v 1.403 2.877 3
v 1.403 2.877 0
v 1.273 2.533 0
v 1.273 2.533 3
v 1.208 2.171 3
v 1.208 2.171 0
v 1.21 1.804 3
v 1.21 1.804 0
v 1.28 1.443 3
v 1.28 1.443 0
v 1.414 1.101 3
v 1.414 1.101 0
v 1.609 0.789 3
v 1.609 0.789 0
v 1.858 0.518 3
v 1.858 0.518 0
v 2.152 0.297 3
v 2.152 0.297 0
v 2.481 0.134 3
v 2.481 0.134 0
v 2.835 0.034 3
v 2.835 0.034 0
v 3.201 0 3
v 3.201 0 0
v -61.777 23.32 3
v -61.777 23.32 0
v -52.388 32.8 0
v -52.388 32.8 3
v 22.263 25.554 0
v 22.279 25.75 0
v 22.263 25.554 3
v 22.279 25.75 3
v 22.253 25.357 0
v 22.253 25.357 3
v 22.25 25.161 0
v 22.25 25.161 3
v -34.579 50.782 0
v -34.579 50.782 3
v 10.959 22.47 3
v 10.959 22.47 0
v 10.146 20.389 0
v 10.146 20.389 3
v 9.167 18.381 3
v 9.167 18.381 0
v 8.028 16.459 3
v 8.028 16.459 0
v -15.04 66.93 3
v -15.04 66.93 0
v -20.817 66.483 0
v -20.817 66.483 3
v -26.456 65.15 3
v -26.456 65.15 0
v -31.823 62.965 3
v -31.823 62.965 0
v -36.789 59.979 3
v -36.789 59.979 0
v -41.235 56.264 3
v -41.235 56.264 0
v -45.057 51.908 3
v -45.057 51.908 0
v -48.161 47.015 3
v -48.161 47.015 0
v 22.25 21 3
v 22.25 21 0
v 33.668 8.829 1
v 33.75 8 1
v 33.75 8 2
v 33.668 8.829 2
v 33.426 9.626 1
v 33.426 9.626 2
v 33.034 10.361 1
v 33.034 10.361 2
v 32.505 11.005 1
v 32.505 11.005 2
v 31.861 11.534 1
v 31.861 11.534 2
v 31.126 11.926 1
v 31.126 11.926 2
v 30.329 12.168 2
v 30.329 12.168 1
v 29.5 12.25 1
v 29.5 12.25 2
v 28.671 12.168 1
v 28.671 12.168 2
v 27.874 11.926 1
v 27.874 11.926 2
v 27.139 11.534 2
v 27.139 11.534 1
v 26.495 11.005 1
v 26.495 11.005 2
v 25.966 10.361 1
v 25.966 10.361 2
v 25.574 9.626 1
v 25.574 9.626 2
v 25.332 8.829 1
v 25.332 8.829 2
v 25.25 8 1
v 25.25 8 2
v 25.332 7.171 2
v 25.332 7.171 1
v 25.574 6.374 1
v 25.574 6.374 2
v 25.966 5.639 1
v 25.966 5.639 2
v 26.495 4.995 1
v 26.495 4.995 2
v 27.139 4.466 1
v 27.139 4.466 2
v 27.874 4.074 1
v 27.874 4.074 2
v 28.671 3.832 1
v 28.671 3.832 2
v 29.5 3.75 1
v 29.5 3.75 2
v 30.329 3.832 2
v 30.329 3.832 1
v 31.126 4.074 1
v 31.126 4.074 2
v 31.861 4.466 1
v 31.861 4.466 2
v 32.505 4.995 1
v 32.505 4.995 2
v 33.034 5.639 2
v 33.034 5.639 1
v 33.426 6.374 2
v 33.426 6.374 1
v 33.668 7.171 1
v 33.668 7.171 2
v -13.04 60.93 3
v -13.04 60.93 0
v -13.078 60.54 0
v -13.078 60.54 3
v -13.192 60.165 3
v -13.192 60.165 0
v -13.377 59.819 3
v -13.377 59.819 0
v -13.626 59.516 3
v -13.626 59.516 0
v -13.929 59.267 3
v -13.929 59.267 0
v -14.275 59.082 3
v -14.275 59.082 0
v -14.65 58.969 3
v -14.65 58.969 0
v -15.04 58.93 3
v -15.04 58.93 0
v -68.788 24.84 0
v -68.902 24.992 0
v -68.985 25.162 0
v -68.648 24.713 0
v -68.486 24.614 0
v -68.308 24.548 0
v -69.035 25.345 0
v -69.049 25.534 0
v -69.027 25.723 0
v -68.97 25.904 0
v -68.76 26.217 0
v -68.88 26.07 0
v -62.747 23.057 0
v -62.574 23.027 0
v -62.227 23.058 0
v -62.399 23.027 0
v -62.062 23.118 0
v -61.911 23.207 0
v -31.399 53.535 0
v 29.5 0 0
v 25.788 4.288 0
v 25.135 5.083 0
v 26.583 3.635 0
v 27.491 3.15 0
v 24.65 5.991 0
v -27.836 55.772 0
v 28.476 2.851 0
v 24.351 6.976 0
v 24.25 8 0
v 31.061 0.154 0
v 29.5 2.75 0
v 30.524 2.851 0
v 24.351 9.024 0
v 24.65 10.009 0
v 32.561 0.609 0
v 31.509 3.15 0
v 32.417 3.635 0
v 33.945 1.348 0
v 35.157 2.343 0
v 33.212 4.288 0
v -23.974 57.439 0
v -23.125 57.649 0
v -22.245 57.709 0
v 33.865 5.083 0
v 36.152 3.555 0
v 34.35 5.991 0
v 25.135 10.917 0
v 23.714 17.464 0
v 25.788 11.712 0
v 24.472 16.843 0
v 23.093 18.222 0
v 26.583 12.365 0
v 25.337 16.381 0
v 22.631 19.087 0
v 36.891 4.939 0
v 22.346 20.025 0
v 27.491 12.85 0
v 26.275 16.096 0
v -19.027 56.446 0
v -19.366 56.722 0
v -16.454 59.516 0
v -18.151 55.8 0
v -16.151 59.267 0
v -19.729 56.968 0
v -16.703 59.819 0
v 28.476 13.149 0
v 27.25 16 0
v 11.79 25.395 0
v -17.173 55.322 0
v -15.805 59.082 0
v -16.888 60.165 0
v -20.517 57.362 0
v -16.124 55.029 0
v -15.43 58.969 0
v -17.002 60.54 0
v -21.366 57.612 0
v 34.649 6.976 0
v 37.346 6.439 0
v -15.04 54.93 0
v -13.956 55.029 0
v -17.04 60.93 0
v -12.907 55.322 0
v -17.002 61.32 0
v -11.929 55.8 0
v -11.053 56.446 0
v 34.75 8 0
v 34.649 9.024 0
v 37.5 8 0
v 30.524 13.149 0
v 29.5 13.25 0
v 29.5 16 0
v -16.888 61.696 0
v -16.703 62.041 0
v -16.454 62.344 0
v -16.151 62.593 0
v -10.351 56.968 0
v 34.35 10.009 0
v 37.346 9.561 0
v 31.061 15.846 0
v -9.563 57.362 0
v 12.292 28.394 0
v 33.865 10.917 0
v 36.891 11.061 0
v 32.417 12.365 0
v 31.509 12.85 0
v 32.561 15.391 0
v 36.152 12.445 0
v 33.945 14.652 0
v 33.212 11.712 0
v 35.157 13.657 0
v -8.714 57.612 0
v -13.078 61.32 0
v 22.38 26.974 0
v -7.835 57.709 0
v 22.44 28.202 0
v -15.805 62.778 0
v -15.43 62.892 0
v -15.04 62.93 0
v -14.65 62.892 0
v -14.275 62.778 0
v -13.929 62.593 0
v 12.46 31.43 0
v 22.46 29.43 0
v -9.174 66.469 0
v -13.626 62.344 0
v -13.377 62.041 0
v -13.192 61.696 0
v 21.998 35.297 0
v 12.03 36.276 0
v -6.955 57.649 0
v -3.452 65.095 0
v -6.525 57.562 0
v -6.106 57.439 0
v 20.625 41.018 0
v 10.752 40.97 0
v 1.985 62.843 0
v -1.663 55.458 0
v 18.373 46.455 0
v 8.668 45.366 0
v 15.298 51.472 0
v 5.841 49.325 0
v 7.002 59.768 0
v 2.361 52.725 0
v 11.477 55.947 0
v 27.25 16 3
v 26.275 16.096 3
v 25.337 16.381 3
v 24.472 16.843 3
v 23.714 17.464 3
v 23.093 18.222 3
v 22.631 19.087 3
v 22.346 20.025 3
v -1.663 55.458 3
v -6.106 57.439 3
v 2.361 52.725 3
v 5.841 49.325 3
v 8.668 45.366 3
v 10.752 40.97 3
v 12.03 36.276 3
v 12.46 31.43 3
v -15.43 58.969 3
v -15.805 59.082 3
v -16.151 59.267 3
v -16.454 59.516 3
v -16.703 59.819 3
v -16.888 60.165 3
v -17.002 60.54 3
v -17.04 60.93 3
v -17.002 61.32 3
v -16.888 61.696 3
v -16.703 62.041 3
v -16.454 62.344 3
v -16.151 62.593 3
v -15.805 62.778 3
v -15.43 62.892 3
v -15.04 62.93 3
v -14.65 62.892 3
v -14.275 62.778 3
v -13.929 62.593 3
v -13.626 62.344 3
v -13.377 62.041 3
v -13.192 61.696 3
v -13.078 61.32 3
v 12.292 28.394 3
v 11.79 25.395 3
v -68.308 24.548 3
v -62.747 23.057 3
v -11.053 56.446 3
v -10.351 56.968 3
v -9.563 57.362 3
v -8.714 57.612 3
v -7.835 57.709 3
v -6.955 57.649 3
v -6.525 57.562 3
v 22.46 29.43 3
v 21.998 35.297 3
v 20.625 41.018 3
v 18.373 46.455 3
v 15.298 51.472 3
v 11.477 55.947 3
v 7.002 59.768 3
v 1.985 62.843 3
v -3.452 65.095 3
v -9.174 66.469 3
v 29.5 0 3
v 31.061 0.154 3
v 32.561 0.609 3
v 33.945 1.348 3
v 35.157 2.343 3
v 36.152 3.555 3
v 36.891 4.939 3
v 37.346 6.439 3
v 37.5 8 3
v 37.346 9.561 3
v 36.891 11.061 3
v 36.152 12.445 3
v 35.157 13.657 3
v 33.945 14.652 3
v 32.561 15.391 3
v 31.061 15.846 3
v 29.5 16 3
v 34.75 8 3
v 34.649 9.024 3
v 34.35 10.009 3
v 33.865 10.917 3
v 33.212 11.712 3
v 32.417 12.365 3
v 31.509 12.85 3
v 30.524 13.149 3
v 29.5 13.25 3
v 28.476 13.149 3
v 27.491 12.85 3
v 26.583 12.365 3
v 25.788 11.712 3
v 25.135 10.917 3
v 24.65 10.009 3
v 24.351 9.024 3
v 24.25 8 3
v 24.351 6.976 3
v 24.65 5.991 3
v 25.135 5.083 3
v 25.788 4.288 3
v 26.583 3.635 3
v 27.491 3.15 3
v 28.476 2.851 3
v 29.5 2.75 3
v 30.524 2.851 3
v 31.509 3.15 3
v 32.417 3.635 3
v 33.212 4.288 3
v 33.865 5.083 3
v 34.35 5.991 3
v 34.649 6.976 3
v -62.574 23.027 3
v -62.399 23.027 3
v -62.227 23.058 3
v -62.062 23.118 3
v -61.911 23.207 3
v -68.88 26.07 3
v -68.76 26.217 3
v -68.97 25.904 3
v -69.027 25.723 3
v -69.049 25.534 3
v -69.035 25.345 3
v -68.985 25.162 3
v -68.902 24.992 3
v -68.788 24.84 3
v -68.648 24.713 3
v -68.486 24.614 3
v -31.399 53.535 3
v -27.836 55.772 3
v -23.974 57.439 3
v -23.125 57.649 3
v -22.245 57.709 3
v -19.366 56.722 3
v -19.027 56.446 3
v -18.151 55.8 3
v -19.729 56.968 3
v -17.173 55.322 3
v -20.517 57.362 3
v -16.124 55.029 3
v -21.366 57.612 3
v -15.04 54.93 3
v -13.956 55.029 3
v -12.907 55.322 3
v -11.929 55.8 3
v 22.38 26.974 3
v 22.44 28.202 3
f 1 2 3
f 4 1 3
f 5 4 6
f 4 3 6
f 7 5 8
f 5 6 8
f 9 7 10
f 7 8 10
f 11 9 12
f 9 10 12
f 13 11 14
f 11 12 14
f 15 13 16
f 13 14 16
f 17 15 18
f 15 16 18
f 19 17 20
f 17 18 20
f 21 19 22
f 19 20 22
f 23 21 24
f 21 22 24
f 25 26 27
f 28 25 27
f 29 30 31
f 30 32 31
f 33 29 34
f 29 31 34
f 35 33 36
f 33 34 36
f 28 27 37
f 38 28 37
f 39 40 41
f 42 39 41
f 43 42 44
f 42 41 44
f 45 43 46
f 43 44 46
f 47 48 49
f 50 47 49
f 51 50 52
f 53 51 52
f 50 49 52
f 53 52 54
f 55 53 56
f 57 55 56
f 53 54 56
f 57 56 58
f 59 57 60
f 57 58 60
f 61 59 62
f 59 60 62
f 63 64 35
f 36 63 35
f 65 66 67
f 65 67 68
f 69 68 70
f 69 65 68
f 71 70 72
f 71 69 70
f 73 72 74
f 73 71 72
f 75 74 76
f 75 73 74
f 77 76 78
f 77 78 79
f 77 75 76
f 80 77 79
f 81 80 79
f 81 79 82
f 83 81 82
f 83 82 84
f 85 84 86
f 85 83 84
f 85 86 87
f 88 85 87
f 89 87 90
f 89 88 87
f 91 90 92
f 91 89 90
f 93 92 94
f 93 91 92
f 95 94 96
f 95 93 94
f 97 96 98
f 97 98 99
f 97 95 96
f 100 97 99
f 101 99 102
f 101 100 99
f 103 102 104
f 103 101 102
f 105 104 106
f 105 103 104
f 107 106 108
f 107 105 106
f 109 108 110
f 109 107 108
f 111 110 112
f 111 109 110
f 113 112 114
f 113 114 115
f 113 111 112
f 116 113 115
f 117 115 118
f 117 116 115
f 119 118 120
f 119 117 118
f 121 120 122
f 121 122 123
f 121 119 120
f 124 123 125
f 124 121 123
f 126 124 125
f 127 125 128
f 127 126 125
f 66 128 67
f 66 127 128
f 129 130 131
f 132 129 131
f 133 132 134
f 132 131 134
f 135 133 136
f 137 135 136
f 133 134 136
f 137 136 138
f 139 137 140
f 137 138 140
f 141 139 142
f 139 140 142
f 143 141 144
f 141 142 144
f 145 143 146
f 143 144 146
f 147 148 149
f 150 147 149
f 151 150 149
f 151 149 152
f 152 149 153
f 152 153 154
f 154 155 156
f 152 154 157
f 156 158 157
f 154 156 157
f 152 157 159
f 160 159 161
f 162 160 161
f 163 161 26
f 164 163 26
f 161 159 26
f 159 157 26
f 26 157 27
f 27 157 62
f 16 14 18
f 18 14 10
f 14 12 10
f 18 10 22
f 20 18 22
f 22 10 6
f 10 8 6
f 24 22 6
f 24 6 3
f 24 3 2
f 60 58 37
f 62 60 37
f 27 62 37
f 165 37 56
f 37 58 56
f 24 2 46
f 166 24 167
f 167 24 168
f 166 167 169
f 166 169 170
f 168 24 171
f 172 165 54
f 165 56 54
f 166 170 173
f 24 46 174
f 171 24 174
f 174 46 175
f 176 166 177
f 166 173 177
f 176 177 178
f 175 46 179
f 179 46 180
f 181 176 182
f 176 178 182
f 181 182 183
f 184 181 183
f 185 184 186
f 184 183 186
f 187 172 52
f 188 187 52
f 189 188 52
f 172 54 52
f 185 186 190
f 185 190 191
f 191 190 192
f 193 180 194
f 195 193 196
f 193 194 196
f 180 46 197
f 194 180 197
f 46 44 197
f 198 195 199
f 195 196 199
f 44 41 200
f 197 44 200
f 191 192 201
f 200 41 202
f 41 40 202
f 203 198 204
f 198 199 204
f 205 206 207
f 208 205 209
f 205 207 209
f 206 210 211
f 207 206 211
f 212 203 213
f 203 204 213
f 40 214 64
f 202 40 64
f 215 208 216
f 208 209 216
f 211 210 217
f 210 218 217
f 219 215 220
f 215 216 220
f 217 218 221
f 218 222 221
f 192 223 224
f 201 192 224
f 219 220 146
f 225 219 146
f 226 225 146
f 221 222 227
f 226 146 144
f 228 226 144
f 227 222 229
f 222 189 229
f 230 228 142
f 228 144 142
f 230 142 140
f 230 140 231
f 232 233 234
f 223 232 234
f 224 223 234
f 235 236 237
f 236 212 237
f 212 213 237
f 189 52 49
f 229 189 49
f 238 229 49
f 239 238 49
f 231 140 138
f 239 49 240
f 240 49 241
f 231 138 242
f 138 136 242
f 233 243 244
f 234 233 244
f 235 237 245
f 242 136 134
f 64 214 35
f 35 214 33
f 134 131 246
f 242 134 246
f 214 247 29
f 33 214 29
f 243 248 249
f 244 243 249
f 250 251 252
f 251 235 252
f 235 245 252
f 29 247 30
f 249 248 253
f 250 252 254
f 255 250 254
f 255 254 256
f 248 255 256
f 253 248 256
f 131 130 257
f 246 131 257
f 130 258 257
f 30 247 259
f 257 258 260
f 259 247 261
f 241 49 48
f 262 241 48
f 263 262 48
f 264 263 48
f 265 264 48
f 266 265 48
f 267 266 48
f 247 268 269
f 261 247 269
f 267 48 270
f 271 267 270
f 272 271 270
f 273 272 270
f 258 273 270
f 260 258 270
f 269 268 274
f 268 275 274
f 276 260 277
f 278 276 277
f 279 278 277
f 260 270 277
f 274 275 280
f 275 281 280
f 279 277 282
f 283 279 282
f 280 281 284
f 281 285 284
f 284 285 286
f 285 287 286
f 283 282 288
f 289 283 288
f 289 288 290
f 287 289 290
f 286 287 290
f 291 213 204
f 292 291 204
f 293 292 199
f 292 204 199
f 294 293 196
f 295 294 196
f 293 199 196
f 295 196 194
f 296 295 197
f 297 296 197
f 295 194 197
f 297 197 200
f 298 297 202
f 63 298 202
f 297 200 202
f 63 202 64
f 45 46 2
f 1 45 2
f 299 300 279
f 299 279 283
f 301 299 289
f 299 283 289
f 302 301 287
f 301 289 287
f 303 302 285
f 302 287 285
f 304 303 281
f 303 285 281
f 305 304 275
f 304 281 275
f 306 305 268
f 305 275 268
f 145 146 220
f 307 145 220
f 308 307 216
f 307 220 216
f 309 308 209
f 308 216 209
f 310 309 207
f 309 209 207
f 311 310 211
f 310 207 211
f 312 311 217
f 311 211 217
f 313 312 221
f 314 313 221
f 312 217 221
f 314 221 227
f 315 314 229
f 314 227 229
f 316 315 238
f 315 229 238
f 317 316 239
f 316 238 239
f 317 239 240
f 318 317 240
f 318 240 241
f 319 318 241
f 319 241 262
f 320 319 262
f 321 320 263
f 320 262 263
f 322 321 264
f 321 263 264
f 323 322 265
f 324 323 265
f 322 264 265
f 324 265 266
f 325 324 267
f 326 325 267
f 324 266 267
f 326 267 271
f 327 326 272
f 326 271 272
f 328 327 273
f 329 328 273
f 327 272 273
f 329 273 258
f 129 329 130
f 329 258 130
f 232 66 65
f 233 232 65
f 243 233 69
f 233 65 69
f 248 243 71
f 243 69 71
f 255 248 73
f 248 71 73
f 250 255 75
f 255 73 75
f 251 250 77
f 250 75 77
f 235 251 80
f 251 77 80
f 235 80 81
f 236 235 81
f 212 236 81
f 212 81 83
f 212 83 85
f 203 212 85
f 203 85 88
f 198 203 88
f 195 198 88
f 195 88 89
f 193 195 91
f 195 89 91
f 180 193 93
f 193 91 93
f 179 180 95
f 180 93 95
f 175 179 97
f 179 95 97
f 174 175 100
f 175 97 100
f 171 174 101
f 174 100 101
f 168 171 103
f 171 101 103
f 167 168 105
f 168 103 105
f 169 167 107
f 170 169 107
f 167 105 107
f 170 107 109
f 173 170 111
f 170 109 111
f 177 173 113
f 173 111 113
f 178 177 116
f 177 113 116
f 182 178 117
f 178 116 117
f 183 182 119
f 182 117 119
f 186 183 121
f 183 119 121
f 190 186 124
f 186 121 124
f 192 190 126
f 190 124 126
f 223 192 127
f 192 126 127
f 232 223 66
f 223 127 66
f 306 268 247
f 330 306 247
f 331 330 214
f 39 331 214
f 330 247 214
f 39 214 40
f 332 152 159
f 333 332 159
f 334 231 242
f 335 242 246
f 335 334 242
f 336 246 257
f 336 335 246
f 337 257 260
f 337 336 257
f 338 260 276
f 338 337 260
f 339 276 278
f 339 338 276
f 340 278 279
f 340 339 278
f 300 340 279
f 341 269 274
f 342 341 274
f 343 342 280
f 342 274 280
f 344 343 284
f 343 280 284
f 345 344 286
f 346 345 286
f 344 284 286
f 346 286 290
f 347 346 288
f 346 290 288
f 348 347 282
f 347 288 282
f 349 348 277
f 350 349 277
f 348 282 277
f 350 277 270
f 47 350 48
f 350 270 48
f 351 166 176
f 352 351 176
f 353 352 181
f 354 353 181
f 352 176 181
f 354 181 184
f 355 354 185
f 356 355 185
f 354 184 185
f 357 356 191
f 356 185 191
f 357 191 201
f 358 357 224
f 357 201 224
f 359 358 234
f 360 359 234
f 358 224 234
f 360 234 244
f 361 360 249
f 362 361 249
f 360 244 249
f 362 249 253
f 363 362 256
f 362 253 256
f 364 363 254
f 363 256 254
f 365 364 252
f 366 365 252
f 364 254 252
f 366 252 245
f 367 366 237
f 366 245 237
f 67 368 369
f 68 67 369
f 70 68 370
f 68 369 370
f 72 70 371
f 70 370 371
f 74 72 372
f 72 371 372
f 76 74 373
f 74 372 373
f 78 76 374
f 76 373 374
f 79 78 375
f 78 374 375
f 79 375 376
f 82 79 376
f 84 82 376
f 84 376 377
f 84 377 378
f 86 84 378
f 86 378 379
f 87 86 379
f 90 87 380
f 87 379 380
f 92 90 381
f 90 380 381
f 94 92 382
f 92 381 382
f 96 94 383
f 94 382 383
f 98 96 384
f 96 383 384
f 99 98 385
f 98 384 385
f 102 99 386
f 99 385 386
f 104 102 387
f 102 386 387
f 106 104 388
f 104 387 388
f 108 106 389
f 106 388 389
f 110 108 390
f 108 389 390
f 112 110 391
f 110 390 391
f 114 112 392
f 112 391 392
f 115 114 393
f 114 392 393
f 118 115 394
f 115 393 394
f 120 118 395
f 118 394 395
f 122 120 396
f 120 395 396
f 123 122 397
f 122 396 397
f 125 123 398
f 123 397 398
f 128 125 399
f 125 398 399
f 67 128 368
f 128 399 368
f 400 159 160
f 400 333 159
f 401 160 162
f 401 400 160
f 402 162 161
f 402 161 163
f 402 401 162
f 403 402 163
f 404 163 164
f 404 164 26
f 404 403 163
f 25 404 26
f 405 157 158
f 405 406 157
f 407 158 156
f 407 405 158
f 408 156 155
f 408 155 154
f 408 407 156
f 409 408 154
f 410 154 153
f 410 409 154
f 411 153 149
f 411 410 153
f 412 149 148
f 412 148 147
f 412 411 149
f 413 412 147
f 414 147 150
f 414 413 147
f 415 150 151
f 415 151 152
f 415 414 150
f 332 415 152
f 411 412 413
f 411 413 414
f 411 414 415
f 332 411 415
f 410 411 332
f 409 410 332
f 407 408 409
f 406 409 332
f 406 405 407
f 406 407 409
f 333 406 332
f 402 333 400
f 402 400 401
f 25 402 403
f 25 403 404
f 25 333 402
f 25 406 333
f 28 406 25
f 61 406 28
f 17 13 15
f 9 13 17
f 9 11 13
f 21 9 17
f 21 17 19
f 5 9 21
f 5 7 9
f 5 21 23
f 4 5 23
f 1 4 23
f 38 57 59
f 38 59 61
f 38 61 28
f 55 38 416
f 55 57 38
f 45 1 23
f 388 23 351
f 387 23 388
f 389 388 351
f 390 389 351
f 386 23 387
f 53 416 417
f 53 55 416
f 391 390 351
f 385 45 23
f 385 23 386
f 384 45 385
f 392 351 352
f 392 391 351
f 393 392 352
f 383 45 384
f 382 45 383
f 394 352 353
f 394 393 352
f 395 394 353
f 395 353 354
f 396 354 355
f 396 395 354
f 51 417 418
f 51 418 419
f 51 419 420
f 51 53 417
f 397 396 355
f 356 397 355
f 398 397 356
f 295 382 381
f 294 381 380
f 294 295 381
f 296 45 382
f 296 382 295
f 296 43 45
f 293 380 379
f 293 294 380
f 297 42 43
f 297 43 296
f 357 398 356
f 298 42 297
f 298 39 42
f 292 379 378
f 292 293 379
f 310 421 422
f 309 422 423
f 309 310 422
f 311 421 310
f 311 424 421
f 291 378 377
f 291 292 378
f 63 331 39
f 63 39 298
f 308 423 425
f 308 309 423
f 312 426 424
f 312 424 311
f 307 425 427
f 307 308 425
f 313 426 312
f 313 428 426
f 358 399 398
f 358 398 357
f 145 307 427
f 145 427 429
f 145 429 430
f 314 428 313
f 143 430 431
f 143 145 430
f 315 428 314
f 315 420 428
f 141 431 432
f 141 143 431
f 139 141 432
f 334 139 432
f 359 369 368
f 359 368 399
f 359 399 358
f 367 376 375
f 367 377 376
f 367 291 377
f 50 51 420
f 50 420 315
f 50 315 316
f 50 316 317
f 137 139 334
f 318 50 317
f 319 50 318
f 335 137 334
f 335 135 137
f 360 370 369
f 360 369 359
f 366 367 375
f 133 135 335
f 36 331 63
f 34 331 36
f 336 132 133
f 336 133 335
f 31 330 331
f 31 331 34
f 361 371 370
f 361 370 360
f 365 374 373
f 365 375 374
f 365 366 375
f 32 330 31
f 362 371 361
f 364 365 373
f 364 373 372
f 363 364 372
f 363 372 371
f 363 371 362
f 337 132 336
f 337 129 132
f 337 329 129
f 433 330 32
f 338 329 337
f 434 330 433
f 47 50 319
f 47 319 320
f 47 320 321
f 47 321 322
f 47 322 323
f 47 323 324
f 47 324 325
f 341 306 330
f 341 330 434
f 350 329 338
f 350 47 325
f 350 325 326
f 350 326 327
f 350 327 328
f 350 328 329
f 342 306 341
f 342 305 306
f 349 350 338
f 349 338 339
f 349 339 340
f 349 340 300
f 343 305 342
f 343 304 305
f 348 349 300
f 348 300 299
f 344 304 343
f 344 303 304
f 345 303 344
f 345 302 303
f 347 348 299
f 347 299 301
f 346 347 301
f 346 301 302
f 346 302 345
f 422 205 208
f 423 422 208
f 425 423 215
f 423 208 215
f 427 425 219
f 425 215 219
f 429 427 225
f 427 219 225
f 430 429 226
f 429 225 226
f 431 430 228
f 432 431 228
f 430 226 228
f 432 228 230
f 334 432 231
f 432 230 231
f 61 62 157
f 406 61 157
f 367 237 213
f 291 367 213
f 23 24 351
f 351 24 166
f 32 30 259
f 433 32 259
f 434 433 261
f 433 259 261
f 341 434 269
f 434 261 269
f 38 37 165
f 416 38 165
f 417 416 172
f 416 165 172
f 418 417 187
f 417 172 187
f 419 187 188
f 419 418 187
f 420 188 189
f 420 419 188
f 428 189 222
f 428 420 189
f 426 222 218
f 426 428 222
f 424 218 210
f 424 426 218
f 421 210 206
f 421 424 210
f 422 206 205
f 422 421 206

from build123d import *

# Parameters (mm, degrees)
F0_R     = 4.25
F1_DEPTH = 3
F2_R     = 5
F3_R     = 6
F4_R     = 1
F5_SIZE  = 1


with BuildPart() as f1:
    # F0 (on Top) → F1 (new body)
    with BuildSketch(Plane.XY):
        with BuildLine():
            Line((-62.1857971695, 22.9072221785), (-52.3882933556, 32.7997051499))
            ThreePointArc((-52.3882933556, 32.7997051499), (-50.9844964361, 40.1186300293), (-48.1611355423, 47.0154365688))
            Line((-48.1611355423, 47.0154365688), (-69.9716899396, 24.9934458586))
            Line((-69.9716899396, 24.9934458586), (-62.1857971695, 22.9072221785))
        make_face()
        with BuildLine():
            ThreePointArc((-48.1611355423, 47.0154365688), (-50.9844964361, 40.1186300293), (-52.3882933556, 32.7997051499))
            Line((-52.3882933556, 32.7997051499), (-34.5789852905, 50.7816605657))
            ThreePointArc((-34.5789852905, 50.7816605657), (-28.0931597891, 55.634884838), (-20.47471121, 58.3878758514))
            ThreePointArc((-20.47471121, 58.3878758514), (-20.102300057, 64.1509445203), (-15.0399766137, 66.9302487327))
            ThreePointArc((-15.0399766137, 66.9302487327), (-34.3636079514, 61.5681900471), (-48.1611355423, 47.0154365688))
        make_face()
        with BuildLine():
            ThreePointArc((-15.0399766137, 66.9302487327), (-20.102300057, 64.1509445203), (-20.47471121, 58.3878758514))
            ThreePointArc((-20.47471121, 58.3878758514), (-17.7708422565, 58.794319571), (-15.0399766285, 58.9302487327))
            ThreePointArc((-15.0399766285, 58.9302487327), (-12.3091109856, 58.7943195724), (-9.6052420174, 58.3878758514))
            ThreePointArc((-9.6052420174, 58.3878758514), (-9.1829975469, 59.628021329), (-9.0399766137, 60.9302487327))
            ThreePointArc((-9.0399766137, 60.9302487327), (-10.7973359266, 65.1728894198), (-15.0399766137, 66.9302487327))
        make_face()
        with BuildLine():
            ThreePointArc((-13.0399766137, 60.9302487327), (-13.6257630566, 59.5160351651), (-15.0399766285, 58.9302487327))
            ThreePointArc((-15.0399766285, 58.9302487327), (-16.4541901709, 62.3444623003), (-13.0399766137, 60.9302487327))
        make_face(mode=Mode.SUBTRACT)
        with BuildLine():
            ThreePointArc((-15.0399766285, 58.9302487327), (-17.7708422565, 58.794319571), (-20.47471121, 58.3878758514))
            ThreePointArc((-20.47471121, 58.3878758514), (-15.0399766137, 54.9302487327), (-9.6052420174, 58.3878758514))
            ThreePointArc((-9.6052420174, 58.3878758514), (-12.3091109856, 58.7943195724), (-15.0399766285, 58.9302487327))
        make_face()
        with BuildLine():
            ThreePointArc((1.4030809655, 2.8767422936), (1.5045728658, 0.9401614715), (3.2006690581, 0))
            Line((3.2006690581, 0), (8.2003000527, 0))
            ThreePointArc((8.2003000527, 0), (17.7947523333, 11.3158739167), (22.25, 25.4669616943))
            ThreePointArc((22.25, 25.4669616943), (22.40748073, 27.4458247627), (22.4600233863, 29.4302487327))
            ThreePointArc((22.4600233863, 29.4302487327), (11.4765276808, 55.9467530272), (-15.0399766137, 66.9302487327))
            ThreePointArc((-15.0399766137, 66.9302487327), (-10.7973359266, 65.1728894198), (-9.0399766137, 60.9302487327))
            ThreePointArc((-9.0399766137, 60.9302487327), (-9.1829975469, 59.628021329), (-9.6052420174, 58.3878758514))
            ThreePointArc((-9.6052420174, 58.3878758514), (6.2403570467, 48.8485551745), (12.4600233863, 31.4302487327))
            ThreePointArc((12.4600233863, 31.4302487327), (12.0822423248, 26.8876459708), (10.9592786697, 22.4698511575))
            ThreePointArc((10.9592786697, 22.4698511575), (9.6768596595, 19.375042196), (8.0276528973, 16.4591275743))
            Line((8.0276528973, 16.4591275743), (1.4030809655, 2.8767422936))
        make_face()
        with BuildLine():
            ThreePointArc((22.25, 25.4669616943), (17.7947523333, 11.3158739167), (8.2003000527, 0))
            Line((8.2003000527, 0), (29.5, 0))
            ThreePointArc((29.5, 0), (37.5, 8), (29.5, 16))
            Line((29.5, 16), (27.25, 16))
            ThreePointArc((27.25, 16), (23.7144660941, 17.4644660941), (22.25, 21))
            Line((22.25, 21), (22.25, 22.4049843981))
            Line((22.25, 22.4049843981), (22.25, 25.4669616943))
        make_face()
        with Locations((29.5, 8)):
            Circle(F0_R, mode=Mode.SUBTRACT)
    extrude(amount=F1_DEPTH)

    # F2
    f2_edges = [f1.edges().sort_by_distance(p)[0] for p in [
        (-20.474711, 58.387876, 1.5),
        (-9.605242, 58.387876, 1.5),
    ]]
    fillet(f2_edges, radius=F2_R)

    # F3
    f3_edges = [f1.edges().sort_by_distance(p)[0] for p in [
        (22.25, 25.466962, 1.5),
    ]]
    fillet(f3_edges, radius=F3_R)

    # F4
    f4_edges = [f1.edges().sort_by_distance(p)[0] for p in [
        (-69.97169, 24.993446, 1.5),
        (-62.185797, 22.907222, 1.5),
    ]]
    fillet(f4_edges, radius=F4_R)

    # F5
    f5_edges = [f1.edges().sort_by_distance(p)[0] for p in [
        (25.25, 8, 3),
        (25.25, 8, 0),
    ]]
    chamfer(f5_edges, length=F5_SIZE)


solid = f1.part
